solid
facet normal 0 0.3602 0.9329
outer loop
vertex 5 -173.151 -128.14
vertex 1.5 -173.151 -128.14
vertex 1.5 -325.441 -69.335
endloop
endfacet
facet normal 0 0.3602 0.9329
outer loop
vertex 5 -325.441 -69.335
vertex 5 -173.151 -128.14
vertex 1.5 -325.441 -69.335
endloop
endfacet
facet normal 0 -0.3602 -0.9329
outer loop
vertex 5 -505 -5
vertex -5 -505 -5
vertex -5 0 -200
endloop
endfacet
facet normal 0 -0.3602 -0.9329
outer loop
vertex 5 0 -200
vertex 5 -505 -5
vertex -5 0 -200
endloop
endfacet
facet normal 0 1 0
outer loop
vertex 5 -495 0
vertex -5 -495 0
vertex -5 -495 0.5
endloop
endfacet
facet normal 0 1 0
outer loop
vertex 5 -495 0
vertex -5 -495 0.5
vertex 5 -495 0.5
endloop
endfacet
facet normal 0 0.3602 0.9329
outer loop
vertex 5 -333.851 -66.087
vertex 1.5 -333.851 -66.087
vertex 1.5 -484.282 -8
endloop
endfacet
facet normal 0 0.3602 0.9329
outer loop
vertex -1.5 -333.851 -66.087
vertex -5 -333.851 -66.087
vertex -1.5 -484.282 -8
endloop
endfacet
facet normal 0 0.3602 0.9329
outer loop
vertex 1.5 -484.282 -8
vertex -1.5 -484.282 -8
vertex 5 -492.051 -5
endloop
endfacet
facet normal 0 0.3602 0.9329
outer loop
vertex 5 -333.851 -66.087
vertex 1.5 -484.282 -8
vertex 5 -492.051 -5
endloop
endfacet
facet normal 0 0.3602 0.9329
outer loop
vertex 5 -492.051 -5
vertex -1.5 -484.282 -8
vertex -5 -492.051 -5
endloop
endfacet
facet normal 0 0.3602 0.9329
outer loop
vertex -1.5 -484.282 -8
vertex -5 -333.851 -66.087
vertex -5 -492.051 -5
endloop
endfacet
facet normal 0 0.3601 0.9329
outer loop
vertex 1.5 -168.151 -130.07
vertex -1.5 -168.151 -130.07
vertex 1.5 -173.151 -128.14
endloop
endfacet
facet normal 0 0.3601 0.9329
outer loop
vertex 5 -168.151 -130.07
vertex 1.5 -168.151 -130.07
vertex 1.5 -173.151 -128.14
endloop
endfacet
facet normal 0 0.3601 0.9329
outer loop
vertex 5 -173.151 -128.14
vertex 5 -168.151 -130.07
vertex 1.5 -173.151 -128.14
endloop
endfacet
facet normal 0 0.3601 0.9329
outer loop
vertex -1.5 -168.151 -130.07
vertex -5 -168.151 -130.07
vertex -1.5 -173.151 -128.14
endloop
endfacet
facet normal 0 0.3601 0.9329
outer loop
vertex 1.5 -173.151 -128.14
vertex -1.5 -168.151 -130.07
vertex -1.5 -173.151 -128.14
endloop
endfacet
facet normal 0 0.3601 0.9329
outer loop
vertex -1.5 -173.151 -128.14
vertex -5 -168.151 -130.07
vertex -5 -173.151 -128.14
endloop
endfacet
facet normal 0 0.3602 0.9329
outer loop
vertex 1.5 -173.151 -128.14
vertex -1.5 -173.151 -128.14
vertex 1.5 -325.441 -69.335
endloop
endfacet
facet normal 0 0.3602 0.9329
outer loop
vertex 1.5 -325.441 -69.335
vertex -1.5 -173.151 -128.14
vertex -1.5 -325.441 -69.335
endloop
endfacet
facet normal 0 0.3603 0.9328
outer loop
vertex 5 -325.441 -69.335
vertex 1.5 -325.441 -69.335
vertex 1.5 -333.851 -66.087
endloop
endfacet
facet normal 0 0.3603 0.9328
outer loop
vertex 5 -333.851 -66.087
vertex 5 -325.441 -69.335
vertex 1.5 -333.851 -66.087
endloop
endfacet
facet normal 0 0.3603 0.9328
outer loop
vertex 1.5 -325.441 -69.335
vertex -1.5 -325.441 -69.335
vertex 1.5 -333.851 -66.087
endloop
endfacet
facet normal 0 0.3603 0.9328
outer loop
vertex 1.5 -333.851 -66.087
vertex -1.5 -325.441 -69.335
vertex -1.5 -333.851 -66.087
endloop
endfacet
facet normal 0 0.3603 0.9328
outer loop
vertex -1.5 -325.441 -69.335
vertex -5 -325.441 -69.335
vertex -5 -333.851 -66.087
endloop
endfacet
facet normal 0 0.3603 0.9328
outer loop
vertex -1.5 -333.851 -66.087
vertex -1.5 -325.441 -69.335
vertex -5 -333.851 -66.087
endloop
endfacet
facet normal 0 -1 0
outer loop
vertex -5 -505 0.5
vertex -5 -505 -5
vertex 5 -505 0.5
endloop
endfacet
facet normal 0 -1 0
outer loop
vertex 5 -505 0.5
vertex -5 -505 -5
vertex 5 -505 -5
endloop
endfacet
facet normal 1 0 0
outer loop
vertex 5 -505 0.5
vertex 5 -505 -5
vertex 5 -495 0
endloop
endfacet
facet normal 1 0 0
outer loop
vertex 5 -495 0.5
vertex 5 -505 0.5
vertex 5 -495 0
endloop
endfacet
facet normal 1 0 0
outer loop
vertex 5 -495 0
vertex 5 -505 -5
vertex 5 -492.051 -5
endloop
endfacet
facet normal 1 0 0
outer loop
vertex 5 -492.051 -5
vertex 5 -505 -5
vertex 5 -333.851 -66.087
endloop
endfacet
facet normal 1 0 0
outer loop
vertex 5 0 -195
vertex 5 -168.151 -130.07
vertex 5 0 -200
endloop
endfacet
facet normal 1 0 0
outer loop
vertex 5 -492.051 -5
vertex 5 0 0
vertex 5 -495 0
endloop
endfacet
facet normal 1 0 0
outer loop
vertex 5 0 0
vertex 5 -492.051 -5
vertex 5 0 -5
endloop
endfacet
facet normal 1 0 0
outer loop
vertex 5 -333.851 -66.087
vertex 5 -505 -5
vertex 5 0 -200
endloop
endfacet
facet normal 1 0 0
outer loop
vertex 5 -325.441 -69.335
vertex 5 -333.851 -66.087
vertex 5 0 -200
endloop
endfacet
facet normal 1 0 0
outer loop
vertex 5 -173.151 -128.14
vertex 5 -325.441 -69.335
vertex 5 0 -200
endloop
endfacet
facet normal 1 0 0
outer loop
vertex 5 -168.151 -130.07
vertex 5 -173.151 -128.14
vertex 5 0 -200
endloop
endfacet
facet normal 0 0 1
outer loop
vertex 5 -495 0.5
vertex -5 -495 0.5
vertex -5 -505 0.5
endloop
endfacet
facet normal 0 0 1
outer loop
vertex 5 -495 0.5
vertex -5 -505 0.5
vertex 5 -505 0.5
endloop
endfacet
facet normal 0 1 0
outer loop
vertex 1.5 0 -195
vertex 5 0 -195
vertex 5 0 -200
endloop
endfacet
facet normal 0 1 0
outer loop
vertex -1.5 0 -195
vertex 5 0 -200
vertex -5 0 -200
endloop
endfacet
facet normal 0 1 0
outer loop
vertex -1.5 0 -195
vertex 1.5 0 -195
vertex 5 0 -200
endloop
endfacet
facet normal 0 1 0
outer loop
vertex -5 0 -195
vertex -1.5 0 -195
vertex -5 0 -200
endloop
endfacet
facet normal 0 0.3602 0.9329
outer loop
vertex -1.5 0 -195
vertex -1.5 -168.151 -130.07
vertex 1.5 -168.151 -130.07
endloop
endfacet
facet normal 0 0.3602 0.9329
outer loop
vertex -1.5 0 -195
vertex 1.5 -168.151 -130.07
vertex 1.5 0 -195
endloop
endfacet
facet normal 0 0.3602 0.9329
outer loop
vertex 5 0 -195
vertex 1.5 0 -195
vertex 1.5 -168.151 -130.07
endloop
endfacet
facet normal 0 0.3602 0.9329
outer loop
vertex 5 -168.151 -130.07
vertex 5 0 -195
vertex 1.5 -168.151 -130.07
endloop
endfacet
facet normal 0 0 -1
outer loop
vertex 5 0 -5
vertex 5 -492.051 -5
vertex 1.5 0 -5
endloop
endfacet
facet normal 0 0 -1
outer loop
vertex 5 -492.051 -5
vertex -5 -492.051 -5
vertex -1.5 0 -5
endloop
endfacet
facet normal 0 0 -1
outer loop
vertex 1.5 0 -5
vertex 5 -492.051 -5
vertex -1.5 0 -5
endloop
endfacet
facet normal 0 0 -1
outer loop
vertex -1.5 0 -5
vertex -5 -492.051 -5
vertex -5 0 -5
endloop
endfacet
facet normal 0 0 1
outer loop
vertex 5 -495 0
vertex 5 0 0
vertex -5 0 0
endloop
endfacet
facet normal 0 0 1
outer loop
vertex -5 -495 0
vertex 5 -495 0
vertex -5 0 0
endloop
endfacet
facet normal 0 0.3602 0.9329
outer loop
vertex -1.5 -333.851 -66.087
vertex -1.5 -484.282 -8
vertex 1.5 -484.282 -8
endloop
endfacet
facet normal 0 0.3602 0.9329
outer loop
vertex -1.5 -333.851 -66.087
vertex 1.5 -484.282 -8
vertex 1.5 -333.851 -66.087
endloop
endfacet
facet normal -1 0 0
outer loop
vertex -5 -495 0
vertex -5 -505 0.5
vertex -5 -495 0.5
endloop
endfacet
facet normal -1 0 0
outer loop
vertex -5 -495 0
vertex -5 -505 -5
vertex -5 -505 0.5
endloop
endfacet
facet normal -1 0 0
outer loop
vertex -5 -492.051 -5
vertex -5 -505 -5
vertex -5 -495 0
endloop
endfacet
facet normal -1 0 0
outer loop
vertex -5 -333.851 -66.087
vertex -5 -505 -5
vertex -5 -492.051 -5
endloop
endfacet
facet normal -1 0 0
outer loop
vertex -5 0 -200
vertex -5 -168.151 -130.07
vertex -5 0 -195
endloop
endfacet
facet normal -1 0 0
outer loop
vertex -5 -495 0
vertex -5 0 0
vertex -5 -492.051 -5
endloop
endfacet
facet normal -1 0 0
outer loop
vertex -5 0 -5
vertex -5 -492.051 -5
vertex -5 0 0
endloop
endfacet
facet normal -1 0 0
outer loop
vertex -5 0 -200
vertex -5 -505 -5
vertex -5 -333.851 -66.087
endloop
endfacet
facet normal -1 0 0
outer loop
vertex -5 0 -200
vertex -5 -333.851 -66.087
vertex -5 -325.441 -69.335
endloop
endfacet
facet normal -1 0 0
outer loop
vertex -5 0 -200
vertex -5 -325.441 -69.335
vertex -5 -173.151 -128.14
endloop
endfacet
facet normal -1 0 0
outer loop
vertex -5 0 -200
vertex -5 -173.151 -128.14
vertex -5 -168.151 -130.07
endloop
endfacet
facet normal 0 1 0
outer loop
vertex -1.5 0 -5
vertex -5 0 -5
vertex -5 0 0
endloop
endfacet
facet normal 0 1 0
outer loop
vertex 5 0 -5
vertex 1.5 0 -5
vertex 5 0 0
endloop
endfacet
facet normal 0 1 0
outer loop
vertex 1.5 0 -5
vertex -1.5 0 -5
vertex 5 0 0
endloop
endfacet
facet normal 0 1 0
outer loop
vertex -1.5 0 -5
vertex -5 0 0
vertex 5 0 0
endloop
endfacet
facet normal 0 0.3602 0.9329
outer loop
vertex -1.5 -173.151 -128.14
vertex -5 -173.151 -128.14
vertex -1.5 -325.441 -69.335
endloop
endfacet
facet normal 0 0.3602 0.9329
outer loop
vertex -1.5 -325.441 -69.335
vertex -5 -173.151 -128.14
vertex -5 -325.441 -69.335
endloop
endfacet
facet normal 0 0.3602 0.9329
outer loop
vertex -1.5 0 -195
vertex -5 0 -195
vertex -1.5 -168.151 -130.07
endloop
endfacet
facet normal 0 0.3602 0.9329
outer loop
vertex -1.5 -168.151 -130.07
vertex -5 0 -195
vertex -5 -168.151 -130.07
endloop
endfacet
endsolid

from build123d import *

# Parameters (mm, degrees)
F1_DEPTH  = 505
F2_DEPTH  = 500.5
F4_DEPTH  = 10
F5_DEPTH  = 10
F7_DEPTH  = 3.5
F8_W      = 10
F8_H      = 10
F10_DEPTH = 0.5
F11_DEPTH = 3.5
F12_W     = 3
F12_H     = 158.2
F12_H_2   = 149.0364306936
F12_H_3   = 168.1512820513
F13_DEPTH = 3
F14_W     = 3
F14_H     = 180.2518238002
F14_H_2   = 163.2489754916
F14_H_3   = 161.2561033061
F15_DEPTH = 3
F16_DEPTH = 40
F17_W     = 5.5675039161
F17_H     = 3.688506484
F18_DEPTH = 25
F19_DEPTH = 25


with BuildPart() as f1:
    # F0 (on Front) → F1 (new body)
    with BuildSketch(Plane.XZ):
        Polygon((5, 0), (0, 0), (-5, 0), (-5, -200), (5, -200), align=None)
    extrude(amount=F1_DEPTH)

    # F0 (on Front) → F2 (join)
    with BuildSketch(Plane.XZ):
        Polygon((5, 0), (0, 0), (-5, 0), (-5, -200), (5, -200), align=None)
    extrude(amount=F2_DEPTH)

    # F3 (on face) → F4 (cut, through all)
    with BuildSketch(Plane(origin=(-5, 0, 0), x_dir=(0, -1, 0), z_dir=(-1, 0, 0))):
        Polygon((328.8512820513, -65.3208171387), (328.8512820513, -5), (179.8148513577, -5), align=None)
        Polygon((173.1512820513, -128.1396039604), (325.4411393395, -69.334609562), (173.1512820513, -7.6970046434), align=None)
        Polygon((168.1512820513, -5), (0, -5), (0, -195), (168.1512820513, -130.0702970297), align=None)
        Polygon((333.8512820513, -66.0871287129), (492.0512820513, -5), (333.8512820513, -5), align=None)
    extrude(amount=-F4_DEPTH, mode=Mode.SUBTRACT)

    # F3 (on face) → F5 (cut, through all)
    with BuildSketch(Plane(origin=(-5, 0, 0), x_dir=(0, -1, 0), z_dir=(-1, 0, 0))):
        Polygon((505, -200), (505, -5), (331.3512820513, -72.0524752475), (0, -200), align=None)
    extrude(amount=-F5_DEPTH, mode=Mode.SUBTRACT)

    # F6 (on face) → F7 (cut)
    with BuildSketch(Plane(origin=(-5, 0, 0), x_dir=(0, -1, 0), z_dir=(-1, 0, 0))):
        Polygon((179.8148513577, -5), (168.1512820513, -5), (168.1512820513, -130.0702970297), (173.1512820513, -128.1396039604), (173.1512820513, -7.6970046434), (325.4411393395, -69.334609562), (333.8512820513, -66.0871287129), (333.8512820513, -5), (328.8512820513, -5), (328.8512820513, -65.3208171387), align=None)
    extrude(amount=-F7_DEPTH, mode=Mode.SUBTRACT)

    # F8 (on face) → F10 (join)
    with BuildSketch(Plane.XY):
        with Locations((0, -500)):
            Rectangle(F8_W, F8_H)
    extrude(amount=F10_DEPTH)

    # F9 (on face) → F11 (cut)
    with BuildSketch(Plane.YZ.offset(5)):
        Polygon((-173.1512820513, -7.6970046434), (-173.1512820513, -128.1396039604), (-168.1512820513, -130.0702970297), (-168.1512820513, -5), (-179.8148513577, -5), (-328.8512820513, -65.3208171387), (-328.8512820513, -5), (-333.8512820513, -5), (-333.8512820513, -66.0871287129), (-325.4411393395, -69.334609562), align=None)
    extrude(amount=-F11_DEPTH, mode=Mode.SUBTRACT)

    # F12 (on face) → F13 (join)
    with BuildSketch(Plane(origin=(0, 0, -5), x_dir=(1, 0, 0), z_dir=(0, 0, -1))):
        with Locations((0, 412.9512820513)):
            Rectangle(F12_W, F12_H)
        with Locations((0, 254.3330667045)):
            Rectangle(F12_W, F12_H_2)
        with Locations((0, 84.0756410256)):
            Rectangle(F12_W, F12_H_3)
    extrude(amount=F13_DEPTH)

    # F14 (on face) → F15 (join)
    with BuildSketch(Plane(origin=(0, -65.5267872377, -169.6975772053), x_dir=(1, 0, 0), z_dir=(0, 0.3602166214, 0.9328686862))):
        with Locations((0, -19.8836707273)):
            Rectangle(F14_W, F14_H)
        with Locations((0, -196.9938815385)):
            Rectangle(F14_W, F14_H_2)
        with Locations((0, -368.2617762991)):
            Rectangle(F14_W, F14_H_3)
    extrude(amount=F15_DEPTH)

    # F16 (add): a face of the model
    f16_faces = [f1.faces().sort_by_distance(p)[0] for p in [
        (0, -167.6109571192, -128.6709940004),
    ]]
    extrude(f16_faces, amount=F16_DEPTH)

    # F17 (on face) → F18 (cut)
    with BuildSketch(Plane(origin=(0, 0, 0), x_dir=(-1, 0, 0), z_dir=(0, 1, 0))):
        with Locations((-0.283751958, -193.155746758)):
            Rectangle(F17_W, F17_H)
    extrude(amount=F18_DEPTH, mode=Mode.SUBTRACT)

    # F19 (cut): a face of the model
    f19_faces = [f1.faces().sort_by_distance(p)[0] for p in [
        (-1.5, -84.0756410256, -7.4725396089),
    ]]
    extrude(f19_faces, amount=-F19_DEPTH, mode=Mode.SUBTRACT)


solid = f1.part
